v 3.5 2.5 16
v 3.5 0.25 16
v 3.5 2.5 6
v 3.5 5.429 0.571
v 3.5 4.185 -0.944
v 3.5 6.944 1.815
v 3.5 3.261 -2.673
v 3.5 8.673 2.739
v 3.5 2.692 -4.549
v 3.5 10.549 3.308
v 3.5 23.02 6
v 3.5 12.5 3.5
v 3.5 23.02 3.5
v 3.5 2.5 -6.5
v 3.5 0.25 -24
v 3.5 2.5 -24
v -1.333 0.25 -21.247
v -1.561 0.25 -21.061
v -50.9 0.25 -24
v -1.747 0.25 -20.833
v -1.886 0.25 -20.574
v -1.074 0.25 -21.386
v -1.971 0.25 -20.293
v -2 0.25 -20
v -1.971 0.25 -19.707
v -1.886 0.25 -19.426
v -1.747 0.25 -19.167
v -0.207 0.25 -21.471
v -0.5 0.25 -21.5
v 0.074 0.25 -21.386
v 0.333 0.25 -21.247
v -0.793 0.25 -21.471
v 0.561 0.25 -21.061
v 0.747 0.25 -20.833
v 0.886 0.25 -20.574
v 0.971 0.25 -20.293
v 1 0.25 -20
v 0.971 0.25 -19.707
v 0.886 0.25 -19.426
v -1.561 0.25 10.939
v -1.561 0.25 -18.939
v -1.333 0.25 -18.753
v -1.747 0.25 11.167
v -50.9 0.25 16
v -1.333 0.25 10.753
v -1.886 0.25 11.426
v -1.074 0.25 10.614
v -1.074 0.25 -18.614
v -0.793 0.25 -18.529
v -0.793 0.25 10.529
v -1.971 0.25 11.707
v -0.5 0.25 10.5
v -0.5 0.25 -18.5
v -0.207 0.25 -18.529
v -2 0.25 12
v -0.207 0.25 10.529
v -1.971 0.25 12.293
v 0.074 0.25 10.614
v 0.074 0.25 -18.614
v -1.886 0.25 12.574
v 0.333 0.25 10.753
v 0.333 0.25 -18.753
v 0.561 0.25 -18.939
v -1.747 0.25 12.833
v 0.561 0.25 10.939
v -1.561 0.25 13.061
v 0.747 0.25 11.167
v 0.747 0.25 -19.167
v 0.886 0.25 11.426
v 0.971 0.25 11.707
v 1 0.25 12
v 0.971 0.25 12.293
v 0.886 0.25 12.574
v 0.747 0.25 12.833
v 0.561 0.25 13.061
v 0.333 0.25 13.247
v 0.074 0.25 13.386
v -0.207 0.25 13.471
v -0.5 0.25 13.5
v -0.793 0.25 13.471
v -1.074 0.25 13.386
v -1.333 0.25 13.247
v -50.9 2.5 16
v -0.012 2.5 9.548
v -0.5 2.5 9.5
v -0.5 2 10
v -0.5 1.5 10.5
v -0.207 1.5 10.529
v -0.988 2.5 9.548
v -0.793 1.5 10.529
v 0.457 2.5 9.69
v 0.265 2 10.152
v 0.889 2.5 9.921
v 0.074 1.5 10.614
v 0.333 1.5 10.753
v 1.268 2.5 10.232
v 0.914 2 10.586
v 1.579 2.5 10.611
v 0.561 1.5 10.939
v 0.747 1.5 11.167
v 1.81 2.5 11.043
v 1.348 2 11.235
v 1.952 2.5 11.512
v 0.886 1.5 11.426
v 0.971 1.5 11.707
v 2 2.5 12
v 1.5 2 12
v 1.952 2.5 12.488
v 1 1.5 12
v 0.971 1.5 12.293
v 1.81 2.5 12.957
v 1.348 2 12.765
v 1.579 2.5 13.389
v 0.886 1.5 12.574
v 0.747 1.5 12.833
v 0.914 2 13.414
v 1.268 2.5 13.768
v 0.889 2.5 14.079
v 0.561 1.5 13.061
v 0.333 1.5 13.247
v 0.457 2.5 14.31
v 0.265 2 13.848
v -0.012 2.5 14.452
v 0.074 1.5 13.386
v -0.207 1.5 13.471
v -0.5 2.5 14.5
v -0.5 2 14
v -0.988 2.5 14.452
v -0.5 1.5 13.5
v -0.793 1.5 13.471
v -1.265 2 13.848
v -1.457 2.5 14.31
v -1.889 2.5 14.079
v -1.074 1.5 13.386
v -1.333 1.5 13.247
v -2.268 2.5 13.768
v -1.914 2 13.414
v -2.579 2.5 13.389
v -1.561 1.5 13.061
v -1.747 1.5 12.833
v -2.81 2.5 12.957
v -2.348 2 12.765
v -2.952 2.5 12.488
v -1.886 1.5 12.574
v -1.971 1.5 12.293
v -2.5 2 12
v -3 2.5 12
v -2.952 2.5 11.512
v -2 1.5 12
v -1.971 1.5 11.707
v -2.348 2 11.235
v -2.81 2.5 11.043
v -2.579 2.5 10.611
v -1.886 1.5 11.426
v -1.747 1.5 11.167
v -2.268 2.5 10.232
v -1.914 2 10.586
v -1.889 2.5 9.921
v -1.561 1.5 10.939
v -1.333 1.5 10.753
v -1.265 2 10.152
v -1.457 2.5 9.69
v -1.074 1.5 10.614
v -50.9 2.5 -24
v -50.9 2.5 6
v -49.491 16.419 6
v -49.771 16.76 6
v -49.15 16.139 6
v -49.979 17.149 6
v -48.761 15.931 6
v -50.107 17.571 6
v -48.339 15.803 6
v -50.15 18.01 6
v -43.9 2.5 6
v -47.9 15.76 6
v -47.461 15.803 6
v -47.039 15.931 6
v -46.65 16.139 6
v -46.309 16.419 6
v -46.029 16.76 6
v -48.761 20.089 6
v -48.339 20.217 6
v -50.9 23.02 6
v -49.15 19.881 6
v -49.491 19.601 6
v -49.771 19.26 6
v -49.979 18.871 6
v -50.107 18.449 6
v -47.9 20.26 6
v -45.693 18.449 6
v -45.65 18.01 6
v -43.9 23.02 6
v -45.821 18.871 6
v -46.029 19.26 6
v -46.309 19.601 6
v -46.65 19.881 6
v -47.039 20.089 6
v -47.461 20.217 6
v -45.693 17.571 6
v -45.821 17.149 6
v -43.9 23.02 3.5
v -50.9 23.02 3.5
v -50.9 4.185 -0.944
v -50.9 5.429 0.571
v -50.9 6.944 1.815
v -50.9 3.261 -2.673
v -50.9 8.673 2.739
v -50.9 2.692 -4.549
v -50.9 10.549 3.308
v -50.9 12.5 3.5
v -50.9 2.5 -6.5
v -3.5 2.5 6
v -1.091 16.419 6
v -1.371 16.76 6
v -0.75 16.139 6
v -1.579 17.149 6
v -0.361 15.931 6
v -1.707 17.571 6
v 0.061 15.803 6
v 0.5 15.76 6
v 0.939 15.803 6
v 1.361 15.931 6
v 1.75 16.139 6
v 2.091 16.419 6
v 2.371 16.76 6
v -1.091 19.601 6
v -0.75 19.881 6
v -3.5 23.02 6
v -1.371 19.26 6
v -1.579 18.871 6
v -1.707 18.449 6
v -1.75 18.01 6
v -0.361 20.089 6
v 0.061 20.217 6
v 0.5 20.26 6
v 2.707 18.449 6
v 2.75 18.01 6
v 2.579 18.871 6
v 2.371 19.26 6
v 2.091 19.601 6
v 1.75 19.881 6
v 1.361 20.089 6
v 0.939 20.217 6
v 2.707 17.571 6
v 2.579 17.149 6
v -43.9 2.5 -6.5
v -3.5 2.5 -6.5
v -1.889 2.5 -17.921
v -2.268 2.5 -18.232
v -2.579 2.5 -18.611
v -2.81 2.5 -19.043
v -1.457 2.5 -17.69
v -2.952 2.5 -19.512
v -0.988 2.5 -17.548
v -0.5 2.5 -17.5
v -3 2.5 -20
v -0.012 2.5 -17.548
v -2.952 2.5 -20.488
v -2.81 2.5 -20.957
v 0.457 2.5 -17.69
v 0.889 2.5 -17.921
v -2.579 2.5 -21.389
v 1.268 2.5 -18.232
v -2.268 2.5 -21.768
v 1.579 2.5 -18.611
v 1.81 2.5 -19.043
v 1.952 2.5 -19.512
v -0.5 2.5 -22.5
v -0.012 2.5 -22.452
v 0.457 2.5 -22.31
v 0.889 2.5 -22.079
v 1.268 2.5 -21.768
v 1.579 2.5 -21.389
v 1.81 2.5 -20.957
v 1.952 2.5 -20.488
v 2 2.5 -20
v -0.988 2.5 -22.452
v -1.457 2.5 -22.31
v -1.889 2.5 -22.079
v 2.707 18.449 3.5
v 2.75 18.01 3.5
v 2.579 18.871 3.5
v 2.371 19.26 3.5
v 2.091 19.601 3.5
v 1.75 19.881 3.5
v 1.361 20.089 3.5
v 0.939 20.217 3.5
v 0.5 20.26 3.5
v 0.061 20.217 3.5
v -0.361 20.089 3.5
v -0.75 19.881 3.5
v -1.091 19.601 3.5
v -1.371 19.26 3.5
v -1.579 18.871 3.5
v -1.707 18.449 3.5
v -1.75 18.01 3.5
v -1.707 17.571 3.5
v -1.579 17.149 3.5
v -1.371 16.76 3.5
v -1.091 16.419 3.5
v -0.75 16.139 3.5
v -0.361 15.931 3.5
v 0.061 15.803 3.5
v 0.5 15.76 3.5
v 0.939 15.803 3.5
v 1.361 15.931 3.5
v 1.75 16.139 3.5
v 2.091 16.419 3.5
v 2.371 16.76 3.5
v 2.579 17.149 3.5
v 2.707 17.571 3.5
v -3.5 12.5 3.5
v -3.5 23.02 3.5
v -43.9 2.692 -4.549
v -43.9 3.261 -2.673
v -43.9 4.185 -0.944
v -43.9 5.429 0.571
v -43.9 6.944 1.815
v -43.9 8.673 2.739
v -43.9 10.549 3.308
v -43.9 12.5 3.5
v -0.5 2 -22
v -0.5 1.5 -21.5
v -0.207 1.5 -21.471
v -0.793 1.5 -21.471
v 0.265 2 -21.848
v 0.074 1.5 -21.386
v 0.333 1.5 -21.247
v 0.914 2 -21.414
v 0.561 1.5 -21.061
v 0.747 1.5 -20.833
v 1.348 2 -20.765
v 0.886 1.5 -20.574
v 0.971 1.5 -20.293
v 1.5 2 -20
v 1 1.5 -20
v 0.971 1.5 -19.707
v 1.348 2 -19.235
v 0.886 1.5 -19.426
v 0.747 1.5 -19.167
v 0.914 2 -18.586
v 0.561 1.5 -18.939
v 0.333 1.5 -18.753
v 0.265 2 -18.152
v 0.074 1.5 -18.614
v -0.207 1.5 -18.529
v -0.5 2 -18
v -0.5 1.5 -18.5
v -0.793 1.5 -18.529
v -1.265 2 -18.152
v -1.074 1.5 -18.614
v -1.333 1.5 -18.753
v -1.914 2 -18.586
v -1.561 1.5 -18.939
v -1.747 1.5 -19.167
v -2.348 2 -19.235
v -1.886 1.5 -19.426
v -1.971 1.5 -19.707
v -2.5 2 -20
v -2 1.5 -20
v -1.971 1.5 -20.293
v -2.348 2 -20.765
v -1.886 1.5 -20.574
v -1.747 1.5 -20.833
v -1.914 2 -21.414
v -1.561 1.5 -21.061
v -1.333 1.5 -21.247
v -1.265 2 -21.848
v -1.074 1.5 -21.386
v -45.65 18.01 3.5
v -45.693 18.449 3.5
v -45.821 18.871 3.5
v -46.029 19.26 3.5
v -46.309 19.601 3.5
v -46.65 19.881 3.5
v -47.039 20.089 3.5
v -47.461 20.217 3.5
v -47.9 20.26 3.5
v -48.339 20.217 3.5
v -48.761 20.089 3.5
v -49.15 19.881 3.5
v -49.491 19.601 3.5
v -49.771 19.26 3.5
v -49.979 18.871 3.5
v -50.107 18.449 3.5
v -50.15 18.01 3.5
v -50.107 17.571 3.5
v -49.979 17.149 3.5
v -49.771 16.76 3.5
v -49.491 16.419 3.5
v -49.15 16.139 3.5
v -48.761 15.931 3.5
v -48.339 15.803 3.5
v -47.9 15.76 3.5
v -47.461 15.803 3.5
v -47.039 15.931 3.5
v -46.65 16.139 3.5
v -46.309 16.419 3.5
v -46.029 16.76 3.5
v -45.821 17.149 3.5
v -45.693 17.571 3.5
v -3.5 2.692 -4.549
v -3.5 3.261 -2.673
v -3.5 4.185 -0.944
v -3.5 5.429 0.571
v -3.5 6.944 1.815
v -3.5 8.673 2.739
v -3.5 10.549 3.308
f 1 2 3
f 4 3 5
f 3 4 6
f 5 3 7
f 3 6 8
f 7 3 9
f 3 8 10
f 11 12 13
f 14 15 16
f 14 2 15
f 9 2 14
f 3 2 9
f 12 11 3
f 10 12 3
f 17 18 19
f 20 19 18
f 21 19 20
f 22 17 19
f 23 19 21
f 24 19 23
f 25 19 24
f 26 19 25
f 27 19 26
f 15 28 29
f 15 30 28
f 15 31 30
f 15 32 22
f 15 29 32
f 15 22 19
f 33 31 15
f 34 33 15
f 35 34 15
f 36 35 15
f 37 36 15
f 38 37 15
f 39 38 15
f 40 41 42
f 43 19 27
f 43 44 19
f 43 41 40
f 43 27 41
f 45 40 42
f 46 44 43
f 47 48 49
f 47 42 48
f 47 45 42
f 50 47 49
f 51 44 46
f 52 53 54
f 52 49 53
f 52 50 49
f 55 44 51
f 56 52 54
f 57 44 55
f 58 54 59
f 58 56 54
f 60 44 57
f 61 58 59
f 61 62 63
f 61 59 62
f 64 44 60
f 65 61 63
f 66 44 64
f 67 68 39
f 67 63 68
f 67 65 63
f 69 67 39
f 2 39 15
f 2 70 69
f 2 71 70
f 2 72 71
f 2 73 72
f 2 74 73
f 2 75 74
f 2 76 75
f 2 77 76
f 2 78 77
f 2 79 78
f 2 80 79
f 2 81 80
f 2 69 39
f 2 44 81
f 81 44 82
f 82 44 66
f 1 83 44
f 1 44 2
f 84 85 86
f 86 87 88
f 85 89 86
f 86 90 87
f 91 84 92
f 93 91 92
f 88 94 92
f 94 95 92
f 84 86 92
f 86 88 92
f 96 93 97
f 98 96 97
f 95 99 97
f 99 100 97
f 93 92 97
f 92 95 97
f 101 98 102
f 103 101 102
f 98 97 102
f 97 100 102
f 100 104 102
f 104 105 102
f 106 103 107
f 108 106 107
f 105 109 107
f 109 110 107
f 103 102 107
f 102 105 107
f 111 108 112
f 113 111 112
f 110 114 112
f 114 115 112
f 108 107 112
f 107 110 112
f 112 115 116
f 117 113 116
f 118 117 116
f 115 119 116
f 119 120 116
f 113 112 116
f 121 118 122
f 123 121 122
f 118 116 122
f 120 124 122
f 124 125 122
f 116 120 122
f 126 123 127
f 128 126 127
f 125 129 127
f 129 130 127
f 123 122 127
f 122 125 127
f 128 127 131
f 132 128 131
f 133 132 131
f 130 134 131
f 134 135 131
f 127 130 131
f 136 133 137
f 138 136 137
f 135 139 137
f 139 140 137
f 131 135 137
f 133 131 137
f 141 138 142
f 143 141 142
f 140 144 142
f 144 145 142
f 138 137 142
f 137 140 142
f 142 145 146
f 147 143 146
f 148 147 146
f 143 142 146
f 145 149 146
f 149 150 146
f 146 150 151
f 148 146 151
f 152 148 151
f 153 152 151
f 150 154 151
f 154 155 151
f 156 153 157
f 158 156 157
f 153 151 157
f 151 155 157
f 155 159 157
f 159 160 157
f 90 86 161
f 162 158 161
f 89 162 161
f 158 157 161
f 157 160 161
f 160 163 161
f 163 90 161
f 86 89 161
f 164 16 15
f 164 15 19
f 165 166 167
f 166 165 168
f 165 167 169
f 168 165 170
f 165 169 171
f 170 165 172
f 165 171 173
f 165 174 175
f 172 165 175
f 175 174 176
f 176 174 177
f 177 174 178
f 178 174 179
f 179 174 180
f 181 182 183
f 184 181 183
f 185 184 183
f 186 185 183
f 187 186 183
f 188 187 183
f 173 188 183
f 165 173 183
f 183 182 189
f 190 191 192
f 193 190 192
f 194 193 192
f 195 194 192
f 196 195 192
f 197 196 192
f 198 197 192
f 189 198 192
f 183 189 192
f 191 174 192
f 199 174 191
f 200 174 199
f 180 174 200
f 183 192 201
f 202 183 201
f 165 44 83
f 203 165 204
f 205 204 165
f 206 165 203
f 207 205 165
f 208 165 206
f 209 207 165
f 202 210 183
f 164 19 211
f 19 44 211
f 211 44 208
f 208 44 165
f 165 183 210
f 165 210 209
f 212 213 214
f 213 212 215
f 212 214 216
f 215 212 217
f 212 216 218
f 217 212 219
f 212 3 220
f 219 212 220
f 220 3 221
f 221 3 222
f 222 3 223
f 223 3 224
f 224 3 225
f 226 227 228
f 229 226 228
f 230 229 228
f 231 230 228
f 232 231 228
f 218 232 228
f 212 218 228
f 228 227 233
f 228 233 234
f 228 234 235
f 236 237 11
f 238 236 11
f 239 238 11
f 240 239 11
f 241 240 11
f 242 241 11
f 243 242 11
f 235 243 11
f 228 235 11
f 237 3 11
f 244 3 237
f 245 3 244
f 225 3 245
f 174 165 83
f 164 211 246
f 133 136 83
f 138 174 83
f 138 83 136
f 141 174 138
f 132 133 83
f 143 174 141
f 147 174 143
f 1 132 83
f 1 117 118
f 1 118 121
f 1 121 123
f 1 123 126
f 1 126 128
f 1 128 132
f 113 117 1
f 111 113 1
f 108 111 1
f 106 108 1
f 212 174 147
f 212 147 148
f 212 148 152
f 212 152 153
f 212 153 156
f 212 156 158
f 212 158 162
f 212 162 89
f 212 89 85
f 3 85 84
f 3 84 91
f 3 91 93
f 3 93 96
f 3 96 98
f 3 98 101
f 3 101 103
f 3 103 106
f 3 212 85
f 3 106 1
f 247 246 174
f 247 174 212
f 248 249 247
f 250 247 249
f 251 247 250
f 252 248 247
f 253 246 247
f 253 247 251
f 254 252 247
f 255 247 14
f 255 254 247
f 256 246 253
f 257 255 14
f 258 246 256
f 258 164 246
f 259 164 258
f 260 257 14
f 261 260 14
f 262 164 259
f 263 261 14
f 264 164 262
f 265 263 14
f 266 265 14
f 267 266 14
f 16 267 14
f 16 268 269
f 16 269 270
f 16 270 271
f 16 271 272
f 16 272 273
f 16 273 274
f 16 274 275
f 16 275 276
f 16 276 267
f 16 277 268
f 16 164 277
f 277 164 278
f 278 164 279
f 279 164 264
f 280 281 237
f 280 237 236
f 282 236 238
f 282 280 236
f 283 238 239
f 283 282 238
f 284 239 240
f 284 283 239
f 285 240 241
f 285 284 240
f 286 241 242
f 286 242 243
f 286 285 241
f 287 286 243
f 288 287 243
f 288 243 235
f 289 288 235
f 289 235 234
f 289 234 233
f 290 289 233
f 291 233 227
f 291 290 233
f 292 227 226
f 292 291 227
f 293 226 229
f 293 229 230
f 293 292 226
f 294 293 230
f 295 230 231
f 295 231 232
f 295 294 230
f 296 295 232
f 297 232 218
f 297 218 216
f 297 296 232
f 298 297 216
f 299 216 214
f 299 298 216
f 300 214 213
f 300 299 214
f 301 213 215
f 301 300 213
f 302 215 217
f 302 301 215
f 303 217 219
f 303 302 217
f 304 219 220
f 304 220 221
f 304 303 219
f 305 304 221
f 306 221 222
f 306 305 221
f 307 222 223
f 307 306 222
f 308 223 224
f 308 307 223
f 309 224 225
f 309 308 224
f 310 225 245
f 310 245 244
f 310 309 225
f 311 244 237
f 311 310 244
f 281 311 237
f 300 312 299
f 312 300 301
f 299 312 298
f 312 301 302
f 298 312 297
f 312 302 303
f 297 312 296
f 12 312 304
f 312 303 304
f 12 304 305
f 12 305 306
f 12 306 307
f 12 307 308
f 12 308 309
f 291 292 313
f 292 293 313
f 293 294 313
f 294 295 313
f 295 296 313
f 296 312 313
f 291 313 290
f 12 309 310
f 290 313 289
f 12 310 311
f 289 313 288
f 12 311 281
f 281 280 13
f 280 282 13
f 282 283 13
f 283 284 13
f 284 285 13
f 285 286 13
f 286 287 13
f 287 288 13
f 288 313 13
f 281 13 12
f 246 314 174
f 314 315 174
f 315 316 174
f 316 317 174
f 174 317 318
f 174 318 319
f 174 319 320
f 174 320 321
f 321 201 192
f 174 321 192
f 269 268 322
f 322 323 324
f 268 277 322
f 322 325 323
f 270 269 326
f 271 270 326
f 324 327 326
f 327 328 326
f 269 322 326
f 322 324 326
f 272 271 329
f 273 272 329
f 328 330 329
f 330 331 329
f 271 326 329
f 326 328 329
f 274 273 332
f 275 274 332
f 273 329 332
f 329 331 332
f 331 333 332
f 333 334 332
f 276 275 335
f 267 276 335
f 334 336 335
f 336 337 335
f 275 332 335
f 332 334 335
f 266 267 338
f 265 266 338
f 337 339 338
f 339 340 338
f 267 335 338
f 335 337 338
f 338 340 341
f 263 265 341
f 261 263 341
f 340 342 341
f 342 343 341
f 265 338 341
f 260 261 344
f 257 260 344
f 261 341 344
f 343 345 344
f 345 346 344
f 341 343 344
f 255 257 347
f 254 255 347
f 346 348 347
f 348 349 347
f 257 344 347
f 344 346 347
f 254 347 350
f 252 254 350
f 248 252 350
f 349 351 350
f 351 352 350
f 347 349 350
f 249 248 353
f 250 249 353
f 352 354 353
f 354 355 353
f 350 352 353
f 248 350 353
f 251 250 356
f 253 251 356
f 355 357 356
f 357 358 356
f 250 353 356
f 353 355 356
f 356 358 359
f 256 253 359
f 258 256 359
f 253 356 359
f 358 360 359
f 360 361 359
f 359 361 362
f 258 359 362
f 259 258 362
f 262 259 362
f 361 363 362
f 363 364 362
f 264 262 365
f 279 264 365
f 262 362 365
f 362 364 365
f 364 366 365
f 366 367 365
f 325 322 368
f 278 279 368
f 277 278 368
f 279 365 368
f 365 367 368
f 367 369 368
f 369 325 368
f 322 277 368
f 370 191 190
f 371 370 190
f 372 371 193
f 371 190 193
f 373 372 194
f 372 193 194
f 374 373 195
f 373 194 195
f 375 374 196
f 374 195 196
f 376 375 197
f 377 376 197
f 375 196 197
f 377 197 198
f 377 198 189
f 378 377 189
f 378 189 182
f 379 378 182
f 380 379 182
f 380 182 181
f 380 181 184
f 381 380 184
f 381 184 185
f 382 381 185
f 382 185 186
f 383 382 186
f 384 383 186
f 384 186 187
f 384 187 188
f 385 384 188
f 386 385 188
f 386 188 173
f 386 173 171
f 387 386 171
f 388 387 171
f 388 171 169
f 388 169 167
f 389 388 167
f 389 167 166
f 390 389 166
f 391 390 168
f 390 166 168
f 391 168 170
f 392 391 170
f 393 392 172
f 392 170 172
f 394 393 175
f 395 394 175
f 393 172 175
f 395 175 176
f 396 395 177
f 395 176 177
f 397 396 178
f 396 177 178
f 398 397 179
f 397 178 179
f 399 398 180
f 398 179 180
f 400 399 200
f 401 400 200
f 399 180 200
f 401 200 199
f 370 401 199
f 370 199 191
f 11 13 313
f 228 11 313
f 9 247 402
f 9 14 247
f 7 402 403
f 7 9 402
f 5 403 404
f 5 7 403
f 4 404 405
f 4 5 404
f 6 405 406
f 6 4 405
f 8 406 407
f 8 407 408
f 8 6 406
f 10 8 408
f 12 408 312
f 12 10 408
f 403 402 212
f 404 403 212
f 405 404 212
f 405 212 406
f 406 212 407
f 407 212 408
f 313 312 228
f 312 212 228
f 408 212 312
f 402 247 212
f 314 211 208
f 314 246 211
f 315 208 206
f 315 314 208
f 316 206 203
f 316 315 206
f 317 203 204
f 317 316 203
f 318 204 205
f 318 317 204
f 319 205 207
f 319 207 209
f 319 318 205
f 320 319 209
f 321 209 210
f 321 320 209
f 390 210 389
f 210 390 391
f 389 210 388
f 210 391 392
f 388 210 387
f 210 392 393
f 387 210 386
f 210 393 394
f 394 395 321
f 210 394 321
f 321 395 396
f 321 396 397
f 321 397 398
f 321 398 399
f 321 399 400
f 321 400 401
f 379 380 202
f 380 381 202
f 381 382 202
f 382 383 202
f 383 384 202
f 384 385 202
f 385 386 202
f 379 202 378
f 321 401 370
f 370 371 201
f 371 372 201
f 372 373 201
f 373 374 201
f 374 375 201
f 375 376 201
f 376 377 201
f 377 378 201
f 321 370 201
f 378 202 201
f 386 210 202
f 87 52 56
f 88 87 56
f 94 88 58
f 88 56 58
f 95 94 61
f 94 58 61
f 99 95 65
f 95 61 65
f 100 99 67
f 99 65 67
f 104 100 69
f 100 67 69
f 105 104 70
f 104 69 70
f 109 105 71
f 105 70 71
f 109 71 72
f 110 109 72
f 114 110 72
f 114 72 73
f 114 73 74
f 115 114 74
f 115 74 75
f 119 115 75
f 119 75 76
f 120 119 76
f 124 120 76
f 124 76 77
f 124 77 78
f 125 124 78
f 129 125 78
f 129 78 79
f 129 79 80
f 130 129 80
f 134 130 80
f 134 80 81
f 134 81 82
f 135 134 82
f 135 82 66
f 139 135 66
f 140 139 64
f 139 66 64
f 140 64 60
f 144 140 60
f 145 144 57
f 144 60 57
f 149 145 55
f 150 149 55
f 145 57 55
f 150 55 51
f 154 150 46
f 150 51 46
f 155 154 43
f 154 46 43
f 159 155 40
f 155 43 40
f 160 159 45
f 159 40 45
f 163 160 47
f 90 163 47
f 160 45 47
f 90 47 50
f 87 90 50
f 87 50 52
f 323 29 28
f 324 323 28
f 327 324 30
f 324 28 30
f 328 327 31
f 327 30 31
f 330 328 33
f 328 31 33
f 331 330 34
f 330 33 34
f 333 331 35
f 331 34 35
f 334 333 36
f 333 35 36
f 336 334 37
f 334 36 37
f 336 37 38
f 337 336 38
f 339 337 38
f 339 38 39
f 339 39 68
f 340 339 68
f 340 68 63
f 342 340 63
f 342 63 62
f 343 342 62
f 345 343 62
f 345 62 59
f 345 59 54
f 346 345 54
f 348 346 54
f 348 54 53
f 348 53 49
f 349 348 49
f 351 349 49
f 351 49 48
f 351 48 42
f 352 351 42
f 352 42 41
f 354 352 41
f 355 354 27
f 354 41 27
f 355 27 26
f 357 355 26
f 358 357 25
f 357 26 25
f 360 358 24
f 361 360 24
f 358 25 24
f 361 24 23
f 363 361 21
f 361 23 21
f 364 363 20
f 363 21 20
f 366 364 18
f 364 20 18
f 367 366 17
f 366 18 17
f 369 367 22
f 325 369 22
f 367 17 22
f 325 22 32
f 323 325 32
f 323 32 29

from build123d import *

# Parameters (mm, degrees)
CROQUIS1_W              = 7
CROQUIS1_H              = 7
SALIENTE_EXTRUIR1_DEPTH = 3
CROQUIS2_R              = 2.25
SALIENTE_EXTRUIR2_DEPTH = 2.5
CROQUIS3_W              = 7
CROQUIS3_H              = 9.5
SALIENTE_EXTRUIR3_DEPTH = 2
CROQUIS4_W              = 7
CROQUIS4_H              = 5
SALIENTE_EXTRUIR4_DEPTH = 20.02
CROQUIS5_W              = 29.52
CROQUIS5_H              = 5
SALIENTE_EXTRUIR5_DEPTH = 40.4
SALIENTE_EXTRUIR6_DEPTH = 7
CROQUIS7_R              = 2.25
CORTAR_EXTRUIR1_DEPTH   = 4.5
CROQUIS8_W              = 54.4
CROQUIS8_H              = 5
SALIENTE_EXTRUIR7_DEPTH = 0.48
CORTAR_EXTRUIR3_DEPTH   = 0.5
CROQUIS11_W             = 54.4
CROQUIS11_H             = 4.5
SALIENTE_EXTRUIR9_DEPTH = 10
CROQUIS12_R             = 1.5
CORTAR_EXTRUIR4_DEPTH   = 62.585797064
CHAFL_N1_SIZE           = 1
CROQUIS13_W             = 54.4
CROQUIS13_H             = 2.25
CORTAR_EXTRUIR5_DEPTH   = 69.707571635
REDONDEO1_R             = 10


with BuildPart() as part:
    # Croquis1 → Saliente-Extruir1 (new body)
    with BuildSketch(Plane(origin=(0, 0, 0), x_dir=(1, 0, 0), z_dir=(0, 1, 0))):
        Rectangle(CROQUIS1_W, CROQUIS1_H)
    extrude(amount=SALIENTE_EXTRUIR1_DEPTH)

    # Croquis2 → Saliente-Extruir2 (add)
    with BuildSketch(Plane.XY.offset(3.5)):
        Polygon((3.5, 3), (3.5, 23.02), (-3.5, 23.02), (-3.5, 3), (-3.5, 0), (3.5, 0), align=None)
        with Locations((0.5, 18.01)):
            Circle(CROQUIS2_R, mode=Mode.SUBTRACT)
    extrude(amount=SALIENTE_EXTRUIR2_DEPTH)

    # Croquis3 → Saliente-Extruir3 (add)
    with BuildSketch(Plane.XZ):
        with Locations((0, 1.25)):
            Rectangle(CROQUIS3_W, CROQUIS3_H)
    extrude(amount=SALIENTE_EXTRUIR3_DEPTH)

    # Croquis4 → Saliente-Extruir4 (add)
    with BuildSketch(Plane(origin=(0, 0, -3.5), x_dir=(-1, 0, 0), z_dir=(0, 0, -1))):
        with Locations((0, 0.5)):
            Rectangle(CROQUIS4_W, CROQUIS4_H)
    extrude(amount=SALIENTE_EXTRUIR4_DEPTH)

    # Croquis5 → Saliente-Extruir5 (add)
    with BuildSketch(Plane.ZY.offset(3.5)):
        with Locations((-8.76, 0.5)):
            Rectangle(CROQUIS5_W, CROQUIS5_H)
    extrude(amount=SALIENTE_EXTRUIR5_DEPTH)

    # Croquis6 → Saliente-Extruir6 (add)
    with BuildSketch(Plane.ZY.offset(43.9)):
        Polygon((6, 3), (6, 23.02), (3.5, 23.02), (3.5, 3), (-23.52, 3), (-23.52, -2), (6, -2), align=None)
    extrude(amount=SALIENTE_EXTRUIR6_DEPTH)

    # Croquis7 → Cortar-Extruir1 (cut)
    with BuildSketch(Plane.XY.offset(6)):
        with Locations((-47.9, 18.01)):
            Circle(CROQUIS7_R)
    extrude(amount=-CORTAR_EXTRUIR1_DEPTH, mode=Mode.SUBTRACT)

    # Croquis8 → Saliente-Extruir7 (add)
    with BuildSketch(Plane(origin=(0, 0, -23.52), x_dir=(-1, 0, 0), z_dir=(0, 0, -1))):
        with Locations((23.7, 0.5)):
            Rectangle(CROQUIS8_W, CROQUIS8_H)
    extrude(amount=SALIENTE_EXTRUIR7_DEPTH)

    # Croquis10 → Cortar-Extruir3 (cut)
    with BuildSketch(Plane(origin=(0, 3, 0), x_dir=(1, 0, 0), z_dir=(0, 1, 0))):
        Polygon((3.5, -3.5), (3.5, 24), (-50.9, 24), (-50.9, -3.5), (-43.9, -3.5), (-43.9, -6), (-3.5, -6), (-3.5, -3.5), align=None)
    extrude(amount=-CORTAR_EXTRUIR3_DEPTH, mode=Mode.SUBTRACT)

    # Croquis11 → Saliente-Extruir9 (add)
    with BuildSketch(Plane.XY.offset(6)):
        with Locations((-23.7, 0.25)):
            Rectangle(CROQUIS11_W, CROQUIS11_H)
    extrude(amount=SALIENTE_EXTRUIR9_DEPTH)

    # Croquis12 → Cortar-Extruir4 (cut, through all)
    with BuildSketch(Plane.XZ.offset(2)):
        with Locations(Location((-0.5, 12, 0), (0, 0, 270))):
            Circle(CROQUIS12_R)
        with Locations(Location((-0.5, -20, 0), (0, 0, 270))):
            Circle(CROQUIS12_R)
    extrude(amount=-CORTAR_EXTRUIR4_DEPTH, mode=Mode.SUBTRACT)

    # Chaflán1
    chafl_n1_edges = [part.edges().sort_by_distance(p)[0] for p in [
        (-0.5, 2.5, 13.5),
        (-0.5, 2.5, -18.5),
    ]]
    chamfer(chafl_n1_edges, length=CHAFL_N1_SIZE)

    # Croquis13 → Cortar-Extruir5 (cut, through all)
    with BuildSketch(Plane.XY.offset(16)):
        with Locations((-23.7, -0.875)):
            Rectangle(CROQUIS13_W, CROQUIS13_H)
    extrude(amount=-CORTAR_EXTRUIR5_DEPTH, mode=Mode.SUBTRACT)

    # Redondeo1
    redondeo1_edges = [part.edges().sort_by_distance(p)[0] for p in [
        (0, 2.5, 3.5),
        (-47.4, 2.5, 3.5),
    ]]
    fillet(redondeo1_edges, radius=REDONDEO1_R)


solid = part.part
